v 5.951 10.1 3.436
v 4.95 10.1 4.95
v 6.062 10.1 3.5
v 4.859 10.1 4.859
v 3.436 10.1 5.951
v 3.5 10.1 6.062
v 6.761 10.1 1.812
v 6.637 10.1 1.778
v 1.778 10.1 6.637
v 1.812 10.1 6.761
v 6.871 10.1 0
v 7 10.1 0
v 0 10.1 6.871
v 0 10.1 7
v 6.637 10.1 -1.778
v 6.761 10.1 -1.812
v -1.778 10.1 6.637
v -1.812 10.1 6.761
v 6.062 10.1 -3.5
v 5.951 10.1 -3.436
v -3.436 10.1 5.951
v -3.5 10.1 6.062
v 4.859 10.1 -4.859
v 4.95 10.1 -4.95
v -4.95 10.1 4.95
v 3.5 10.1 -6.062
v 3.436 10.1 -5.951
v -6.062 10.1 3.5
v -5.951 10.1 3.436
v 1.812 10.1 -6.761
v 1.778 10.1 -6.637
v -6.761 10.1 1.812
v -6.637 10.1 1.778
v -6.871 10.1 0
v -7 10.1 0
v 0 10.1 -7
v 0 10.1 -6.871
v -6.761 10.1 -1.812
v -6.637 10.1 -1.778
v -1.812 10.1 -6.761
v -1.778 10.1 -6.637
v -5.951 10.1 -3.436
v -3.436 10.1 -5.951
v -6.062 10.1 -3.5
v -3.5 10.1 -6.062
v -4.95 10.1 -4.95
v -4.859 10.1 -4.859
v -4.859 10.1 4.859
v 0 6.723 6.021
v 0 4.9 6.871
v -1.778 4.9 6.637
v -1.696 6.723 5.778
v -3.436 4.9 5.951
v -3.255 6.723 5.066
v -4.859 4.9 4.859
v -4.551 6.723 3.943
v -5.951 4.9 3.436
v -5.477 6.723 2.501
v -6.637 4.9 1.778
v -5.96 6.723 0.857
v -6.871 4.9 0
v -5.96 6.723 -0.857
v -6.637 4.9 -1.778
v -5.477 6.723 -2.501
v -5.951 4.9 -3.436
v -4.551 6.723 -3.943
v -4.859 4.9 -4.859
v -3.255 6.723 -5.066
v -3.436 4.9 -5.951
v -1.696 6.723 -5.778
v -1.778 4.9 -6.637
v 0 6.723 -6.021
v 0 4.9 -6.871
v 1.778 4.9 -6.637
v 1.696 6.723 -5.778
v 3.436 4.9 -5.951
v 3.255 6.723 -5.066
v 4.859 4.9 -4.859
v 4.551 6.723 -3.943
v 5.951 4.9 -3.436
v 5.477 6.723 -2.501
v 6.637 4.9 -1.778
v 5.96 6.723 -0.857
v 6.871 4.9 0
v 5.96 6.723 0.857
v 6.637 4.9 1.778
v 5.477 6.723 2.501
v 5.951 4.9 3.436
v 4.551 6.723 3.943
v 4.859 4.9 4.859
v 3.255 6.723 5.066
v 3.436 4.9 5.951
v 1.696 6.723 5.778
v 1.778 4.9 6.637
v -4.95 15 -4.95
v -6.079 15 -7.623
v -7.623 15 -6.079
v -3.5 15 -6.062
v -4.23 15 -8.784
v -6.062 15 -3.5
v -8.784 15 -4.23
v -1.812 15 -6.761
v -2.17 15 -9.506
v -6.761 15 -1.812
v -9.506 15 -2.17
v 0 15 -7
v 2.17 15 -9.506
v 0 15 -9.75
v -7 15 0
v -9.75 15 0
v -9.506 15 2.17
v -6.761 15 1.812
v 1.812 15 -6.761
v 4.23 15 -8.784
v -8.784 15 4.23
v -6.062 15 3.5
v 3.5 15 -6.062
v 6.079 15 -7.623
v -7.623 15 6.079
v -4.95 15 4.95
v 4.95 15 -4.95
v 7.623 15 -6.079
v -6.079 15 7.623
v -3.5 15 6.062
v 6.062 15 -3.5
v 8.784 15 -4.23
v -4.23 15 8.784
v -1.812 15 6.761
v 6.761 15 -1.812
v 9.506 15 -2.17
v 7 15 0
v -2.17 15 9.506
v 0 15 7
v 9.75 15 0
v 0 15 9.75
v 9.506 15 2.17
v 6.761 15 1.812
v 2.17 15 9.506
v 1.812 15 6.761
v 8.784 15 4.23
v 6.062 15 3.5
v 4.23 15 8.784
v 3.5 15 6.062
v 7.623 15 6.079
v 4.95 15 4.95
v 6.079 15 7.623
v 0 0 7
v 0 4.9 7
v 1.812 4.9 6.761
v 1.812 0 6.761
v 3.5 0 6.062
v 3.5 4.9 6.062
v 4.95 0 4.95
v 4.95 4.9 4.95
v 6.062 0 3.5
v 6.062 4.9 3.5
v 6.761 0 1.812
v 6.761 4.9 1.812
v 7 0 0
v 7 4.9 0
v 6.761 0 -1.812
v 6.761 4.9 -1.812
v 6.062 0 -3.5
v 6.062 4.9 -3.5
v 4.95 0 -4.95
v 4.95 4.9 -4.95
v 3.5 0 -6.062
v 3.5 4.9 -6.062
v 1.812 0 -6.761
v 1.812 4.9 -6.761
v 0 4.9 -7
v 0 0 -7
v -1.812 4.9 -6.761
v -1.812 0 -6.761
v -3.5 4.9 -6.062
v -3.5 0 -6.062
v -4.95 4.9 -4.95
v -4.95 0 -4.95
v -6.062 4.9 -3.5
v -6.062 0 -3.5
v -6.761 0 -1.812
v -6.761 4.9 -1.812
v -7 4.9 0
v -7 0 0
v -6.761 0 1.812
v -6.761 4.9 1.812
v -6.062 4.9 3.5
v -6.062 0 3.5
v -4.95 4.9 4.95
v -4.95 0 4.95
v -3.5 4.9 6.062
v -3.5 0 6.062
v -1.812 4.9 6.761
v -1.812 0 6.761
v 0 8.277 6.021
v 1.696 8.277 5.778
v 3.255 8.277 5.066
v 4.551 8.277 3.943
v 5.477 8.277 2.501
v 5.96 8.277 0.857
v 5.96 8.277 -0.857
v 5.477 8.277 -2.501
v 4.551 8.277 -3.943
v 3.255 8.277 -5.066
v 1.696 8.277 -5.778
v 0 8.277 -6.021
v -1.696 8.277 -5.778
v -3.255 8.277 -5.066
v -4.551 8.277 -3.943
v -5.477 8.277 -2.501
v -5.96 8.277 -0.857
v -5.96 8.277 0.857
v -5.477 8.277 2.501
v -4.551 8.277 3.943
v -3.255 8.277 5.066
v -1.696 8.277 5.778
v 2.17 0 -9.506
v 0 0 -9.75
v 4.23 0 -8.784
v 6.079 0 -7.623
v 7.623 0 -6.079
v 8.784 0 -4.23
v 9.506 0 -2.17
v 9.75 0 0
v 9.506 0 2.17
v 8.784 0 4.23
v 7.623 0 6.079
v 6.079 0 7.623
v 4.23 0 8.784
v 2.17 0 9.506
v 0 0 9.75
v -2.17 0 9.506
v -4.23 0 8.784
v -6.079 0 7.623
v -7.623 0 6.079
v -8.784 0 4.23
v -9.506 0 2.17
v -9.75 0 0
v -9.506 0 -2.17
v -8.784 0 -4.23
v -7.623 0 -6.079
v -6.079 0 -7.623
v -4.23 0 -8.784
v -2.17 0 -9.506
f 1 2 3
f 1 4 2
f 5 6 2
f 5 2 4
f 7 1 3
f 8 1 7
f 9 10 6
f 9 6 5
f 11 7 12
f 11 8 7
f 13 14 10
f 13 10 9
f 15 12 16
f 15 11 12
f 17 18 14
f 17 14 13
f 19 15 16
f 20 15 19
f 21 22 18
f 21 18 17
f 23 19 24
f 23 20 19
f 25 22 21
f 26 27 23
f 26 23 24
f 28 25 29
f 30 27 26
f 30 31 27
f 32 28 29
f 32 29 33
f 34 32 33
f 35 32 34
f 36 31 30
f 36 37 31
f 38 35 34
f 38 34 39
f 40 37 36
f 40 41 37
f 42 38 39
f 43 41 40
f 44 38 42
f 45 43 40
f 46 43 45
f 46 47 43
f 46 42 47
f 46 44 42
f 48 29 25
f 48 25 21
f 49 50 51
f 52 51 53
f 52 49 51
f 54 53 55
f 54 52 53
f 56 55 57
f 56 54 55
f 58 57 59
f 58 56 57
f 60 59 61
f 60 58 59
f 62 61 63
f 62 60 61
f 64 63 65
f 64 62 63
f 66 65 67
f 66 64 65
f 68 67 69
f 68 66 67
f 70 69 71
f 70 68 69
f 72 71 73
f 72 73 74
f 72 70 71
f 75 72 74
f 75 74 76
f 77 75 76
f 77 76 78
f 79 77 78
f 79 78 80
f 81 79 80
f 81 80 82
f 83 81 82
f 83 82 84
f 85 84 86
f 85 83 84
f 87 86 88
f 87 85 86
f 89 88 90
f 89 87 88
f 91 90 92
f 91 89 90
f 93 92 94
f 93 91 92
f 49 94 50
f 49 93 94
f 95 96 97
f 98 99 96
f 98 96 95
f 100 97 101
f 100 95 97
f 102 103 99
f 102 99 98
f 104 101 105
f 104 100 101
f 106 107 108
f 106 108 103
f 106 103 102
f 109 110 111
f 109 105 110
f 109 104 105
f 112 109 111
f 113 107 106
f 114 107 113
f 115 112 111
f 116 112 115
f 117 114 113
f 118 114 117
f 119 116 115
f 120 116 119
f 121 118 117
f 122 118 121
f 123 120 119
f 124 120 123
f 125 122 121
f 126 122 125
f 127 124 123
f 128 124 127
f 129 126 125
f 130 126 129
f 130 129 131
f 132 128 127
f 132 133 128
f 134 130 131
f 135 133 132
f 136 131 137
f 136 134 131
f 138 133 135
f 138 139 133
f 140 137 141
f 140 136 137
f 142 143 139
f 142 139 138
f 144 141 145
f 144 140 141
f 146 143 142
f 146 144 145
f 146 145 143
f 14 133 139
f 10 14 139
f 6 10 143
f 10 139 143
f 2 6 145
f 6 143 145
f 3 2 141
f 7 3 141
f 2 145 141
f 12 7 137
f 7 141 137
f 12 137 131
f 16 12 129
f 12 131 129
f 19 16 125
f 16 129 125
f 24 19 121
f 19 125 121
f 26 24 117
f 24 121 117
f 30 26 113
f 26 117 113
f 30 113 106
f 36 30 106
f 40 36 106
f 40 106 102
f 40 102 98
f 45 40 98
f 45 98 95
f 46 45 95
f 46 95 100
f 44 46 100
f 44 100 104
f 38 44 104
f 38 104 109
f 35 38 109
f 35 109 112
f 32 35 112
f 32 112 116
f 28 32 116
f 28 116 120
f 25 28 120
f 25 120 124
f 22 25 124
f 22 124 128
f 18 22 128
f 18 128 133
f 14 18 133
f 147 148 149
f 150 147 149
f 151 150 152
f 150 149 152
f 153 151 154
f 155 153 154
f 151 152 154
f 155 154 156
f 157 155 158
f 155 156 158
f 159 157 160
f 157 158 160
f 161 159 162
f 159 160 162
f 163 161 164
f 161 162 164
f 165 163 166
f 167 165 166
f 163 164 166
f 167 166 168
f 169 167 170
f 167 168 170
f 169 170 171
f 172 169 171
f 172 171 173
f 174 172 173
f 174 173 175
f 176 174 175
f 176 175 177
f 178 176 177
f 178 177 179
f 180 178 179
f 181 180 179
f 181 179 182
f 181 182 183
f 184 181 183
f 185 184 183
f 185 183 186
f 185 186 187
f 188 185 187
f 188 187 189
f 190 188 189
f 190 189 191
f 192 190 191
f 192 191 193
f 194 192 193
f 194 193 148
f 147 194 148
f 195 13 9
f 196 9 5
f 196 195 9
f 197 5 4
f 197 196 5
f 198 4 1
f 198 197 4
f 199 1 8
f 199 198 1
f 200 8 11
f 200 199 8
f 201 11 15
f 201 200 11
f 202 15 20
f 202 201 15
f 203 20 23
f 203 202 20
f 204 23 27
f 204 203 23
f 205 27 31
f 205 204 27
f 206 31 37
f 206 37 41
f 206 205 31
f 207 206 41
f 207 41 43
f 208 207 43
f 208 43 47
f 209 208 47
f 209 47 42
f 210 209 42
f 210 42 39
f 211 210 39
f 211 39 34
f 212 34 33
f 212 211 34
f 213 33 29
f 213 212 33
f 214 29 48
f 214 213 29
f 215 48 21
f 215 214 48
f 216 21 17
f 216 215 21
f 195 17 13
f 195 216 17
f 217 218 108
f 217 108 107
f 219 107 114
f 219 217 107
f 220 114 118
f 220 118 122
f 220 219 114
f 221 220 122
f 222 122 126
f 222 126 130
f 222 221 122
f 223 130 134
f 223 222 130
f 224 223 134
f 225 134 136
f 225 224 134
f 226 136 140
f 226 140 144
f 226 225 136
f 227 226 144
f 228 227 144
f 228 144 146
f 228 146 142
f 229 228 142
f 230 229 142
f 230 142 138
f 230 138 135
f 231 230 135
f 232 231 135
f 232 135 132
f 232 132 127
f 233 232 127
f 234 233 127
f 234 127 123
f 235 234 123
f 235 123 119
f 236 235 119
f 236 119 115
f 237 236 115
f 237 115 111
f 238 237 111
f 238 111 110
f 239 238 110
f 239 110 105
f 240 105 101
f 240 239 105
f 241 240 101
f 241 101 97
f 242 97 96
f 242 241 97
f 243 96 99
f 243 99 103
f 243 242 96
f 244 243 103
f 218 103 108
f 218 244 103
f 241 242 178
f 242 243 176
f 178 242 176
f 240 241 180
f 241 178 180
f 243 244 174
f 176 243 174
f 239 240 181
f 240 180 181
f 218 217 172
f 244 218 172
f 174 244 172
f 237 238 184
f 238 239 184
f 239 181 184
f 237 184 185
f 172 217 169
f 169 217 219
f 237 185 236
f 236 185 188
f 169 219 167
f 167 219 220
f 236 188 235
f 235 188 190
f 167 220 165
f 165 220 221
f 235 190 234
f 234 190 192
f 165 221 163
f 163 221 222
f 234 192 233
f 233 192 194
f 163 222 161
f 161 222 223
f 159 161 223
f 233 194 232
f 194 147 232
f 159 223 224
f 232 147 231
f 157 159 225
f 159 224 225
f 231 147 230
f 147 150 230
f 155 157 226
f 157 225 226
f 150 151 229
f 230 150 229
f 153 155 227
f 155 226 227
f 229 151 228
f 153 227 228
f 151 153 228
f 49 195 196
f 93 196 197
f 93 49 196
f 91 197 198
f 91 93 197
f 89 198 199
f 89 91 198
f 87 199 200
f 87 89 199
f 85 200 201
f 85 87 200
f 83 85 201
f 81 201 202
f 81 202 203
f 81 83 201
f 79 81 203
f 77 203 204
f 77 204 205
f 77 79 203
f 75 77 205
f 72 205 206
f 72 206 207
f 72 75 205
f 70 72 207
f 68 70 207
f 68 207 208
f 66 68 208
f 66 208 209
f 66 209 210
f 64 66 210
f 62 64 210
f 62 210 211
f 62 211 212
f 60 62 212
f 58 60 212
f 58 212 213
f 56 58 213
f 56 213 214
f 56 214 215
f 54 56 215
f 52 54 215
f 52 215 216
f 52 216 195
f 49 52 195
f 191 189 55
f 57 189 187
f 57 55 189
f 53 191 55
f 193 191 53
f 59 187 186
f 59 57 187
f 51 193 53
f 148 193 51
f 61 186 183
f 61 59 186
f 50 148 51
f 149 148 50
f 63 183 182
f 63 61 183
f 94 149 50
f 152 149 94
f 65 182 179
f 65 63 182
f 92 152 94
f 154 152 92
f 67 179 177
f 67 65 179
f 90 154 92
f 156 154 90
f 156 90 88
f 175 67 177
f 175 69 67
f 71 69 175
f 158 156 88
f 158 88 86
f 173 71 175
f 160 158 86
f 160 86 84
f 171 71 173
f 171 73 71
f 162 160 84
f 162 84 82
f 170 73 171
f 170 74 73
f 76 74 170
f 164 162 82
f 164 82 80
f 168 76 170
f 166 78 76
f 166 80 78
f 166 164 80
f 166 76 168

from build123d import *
from OCP.BRepFilletAPI import BRepFilletAPI_MakeChamfer

# Parameters (mm, degrees)
SKETCH1_R           = 12
SKETCH1_R_2         = 5
BOSS_EXTRUDE1_DEPTH = 15
SKETCH2_R           = 7
CUT_EXTRUDE1_DEPTH  = 5.1
CUT_EXTRUDE2_START  = -5.1
SKETCH3_R           = 7
CUT_EXTRUDE2_DEPTH  = 5.1
BOSS_EXTRUDE2_START = -4.8
SKETCH4_R           = 5
SKETCH4_R_2         = 3
BOSS_EXTRUDE2_DEPTH = 4.8
SKETCH5_R           = 17.644165846
SKETCH5_R_2         = 10
CUT_EXTRUDE3_DEPTH  = 17.1
SKETCH6_R           = 7.1
CUT_EXTRUDE4_DEPTH  = 5.1
CUT_EXTRUDE5_START  = -5.1
SKETCH7_R           = 7.1
CUT_EXTRUDE5_DEPTH  = 5.1
SKETCH8_R           = 14.835126002
SKETCH8_R_2         = 9.75
CUT_EXTRUDE7_DEPTH  = 26
SKETCH9_R           = 6.0214871
CUT_EXTRUDE8_DEPTH  = 10
BOSS_EXTRUDE3_START = 0.2
SKETCH10_R          = 7.1
SKETCH10_R_2        = 6.0214871
BOSS_EXTRUDE3_DEPTH = 0.2
SKETCH11_R          = 7.1
SKETCH11_R_2        = 6.0214871
BOSS_EXTRUDE4_DEPTH = 0.2
CHAMFER2_SIZE       = 0.85
CHAMFER2_SIZE2      = 1.822830882
BOSS_EXTRUDE5_REACH = 22.375
SKETCH12_R          = 9.75
SKETCH12_R_2        = 7


with BuildPart() as part:
    # Sketch1 → Boss-Extrude1 (new body)
    with BuildSketch(Plane(origin=(0, 0, 0), x_dir=(1, 0, 0), z_dir=(0, 1, 0))):
        with Locations(Location((0, 0, 0), (0, 0, 270))):
            Circle(SKETCH1_R)
        with Locations(Location((0, 0, 0), (0, 0, 270))):
            Circle(SKETCH1_R_2, mode=Mode.SUBTRACT)
    extrude(amount=BOSS_EXTRUDE1_DEPTH)

    # Sketch2 → Cut-Extrude1 (cut)
    with BuildSketch(Plane.XZ):
        with Locations(Location((0, 0, 0), (0, 0, 270))):
            Circle(SKETCH2_R)
    extrude(amount=-CUT_EXTRUDE1_DEPTH, mode=Mode.SUBTRACT)

    # Sketch3 → Cut-Extrude2 (cut)
    with BuildSketch(Plane(origin=(0, 15, 0), x_dir=(1, 0, 0), z_dir=(0, 1, 0)).offset(CUT_EXTRUDE2_START)):
        with Locations(Location((0, 0, 0), (0, 0, 90))):
            Circle(SKETCH3_R)
    extrude(amount=CUT_EXTRUDE2_DEPTH, mode=Mode.SUBTRACT)

    # Sketch4 → Boss-Extrude2 (add)
    with BuildSketch(Plane(origin=(0, 9.9, 0), x_dir=(1, 0, 0), z_dir=(0, 1, 0)).offset(BOSS_EXTRUDE2_START)):
        Circle(SKETCH4_R)
        with Locations(Location((0, 0, 0), (0, 0, 270))):
            Circle(SKETCH4_R_2, mode=Mode.SUBTRACT)
    extrude(amount=BOSS_EXTRUDE2_DEPTH)

    # Sketch5 → Cut-Extrude3 (cut)
    with BuildSketch(Plane.XZ):
        Circle(SKETCH5_R)
        with Locations(Location((0, 0, 0), (0, 0, 270))):
            Circle(SKETCH5_R_2, mode=Mode.SUBTRACT)
    extrude(amount=-CUT_EXTRUDE3_DEPTH, mode=Mode.SUBTRACT)

    # Sketch6 → Cut-Extrude4 (cut)
    with BuildSketch(Plane.XZ):
        with Locations(Location((0, 0, 0), (0, 0, 270))):
            Circle(SKETCH6_R)
    extrude(amount=-CUT_EXTRUDE4_DEPTH, mode=Mode.SUBTRACT)

    # Sketch7 → Cut-Extrude5 (cut)
    with BuildSketch(Plane(origin=(0, 15, 0), x_dir=(1, 0, 0), z_dir=(0, 1, 0)).offset(CUT_EXTRUDE5_START)):
        with Locations(Location((0, 0, 0), (0, 0, 90))):
            Circle(SKETCH7_R)
    extrude(amount=CUT_EXTRUDE5_DEPTH, mode=Mode.SUBTRACT)

    # Sketch8 → Cut-Extrude7 (cut)
    with BuildSketch(Plane.XZ):
        Circle(SKETCH8_R)
        with Locations(Location((0, 0, 0), (0, 0, 270))):
            Circle(SKETCH8_R_2, mode=Mode.SUBTRACT)
    extrude(amount=-CUT_EXTRUDE7_DEPTH, mode=Mode.SUBTRACT)

    # Sketch9 → Cut-Extrude8 (cut)
    with BuildSketch(Plane(origin=(0, 9.9, 0), x_dir=(1, 0, 0), z_dir=(0, 1, 0))):
        with Locations(Location((0, 0, 0), (0, 0, 270))):
            Circle(SKETCH9_R)
    extrude(amount=-CUT_EXTRUDE8_DEPTH, mode=Mode.SUBTRACT)

    # Sketch10 → Boss-Extrude3 (add)
    with BuildSketch(Plane.XZ.offset(-5.1).offset(BOSS_EXTRUDE3_START)):
        with Locations(Location((0, 0, 0), (0, 0, 270))):
            Circle(SKETCH10_R)
        with Locations(Location((0, 0, 0), (0, 0, 90))):
            Circle(SKETCH10_R_2, mode=Mode.SUBTRACT)
    extrude(amount=-BOSS_EXTRUDE3_DEPTH)

    # Sketch11 → Boss-Extrude4 (add)
    with BuildSketch(Plane(origin=(0, 9.9, 0), x_dir=(1, 0, 0), z_dir=(0, 1, 0))):
        with Locations(Location((0, 0, 0), (0, 0, 90))):
            Circle(SKETCH11_R)
        with Locations(Location((0, 0, 0), (0, 0, 270))):
            Circle(SKETCH11_R_2, mode=Mode.SUBTRACT)
    extrude(amount=BOSS_EXTRUDE4_DEPTH)

    # Chamfer2: one chamfer whose edges measure the first distance from different faces: ONE call of the kernel's chamfer builder (chamfer() names one face for all edges)
    chamfer2_edges_1 = [part.edges().sort_by_distance(p)[0] for p in [
        (0, 4.9, -6.0214871),
    ]]
    chamfer2_side_1 = [part.faces().sort_by_distance(p)[0] for p in [
        (0, 4.9, 6.899181674),
    ]]
    chamfer2_edges_2 = [part.edges().sort_by_distance(p)[0] for p in [
        (0, 10.1, -6.0214871),
    ]]
    chamfer2_side_2 = [part.faces().sort_by_distance(p)[0] for p in [
        (0, 10.1, 6.899181674),
    ]]
    chamfer2 = BRepFilletAPI_MakeChamfer(part.part.solid().wrapped)
    for e in chamfer2_edges_1:
        chamfer2.Add(CHAMFER2_SIZE, CHAMFER2_SIZE2, e.wrapped, chamfer2_side_1[0].wrapped)  # the first distance lies on this face
    for e in chamfer2_edges_2:
        chamfer2.Add(CHAMFER2_SIZE, CHAMFER2_SIZE2, e.wrapped, chamfer2_side_2[0].wrapped)  # the first distance lies on this face
    add(Compound.cast(chamfer2.Shape()), mode=Mode.REPLACE)

    # Boss-Extrude5: up to this face of the body (flat: up to its plane)
    boss_extrude5_end = Plane(part.part.faces().sort_by_distance((0, 0, 9.474228355))[0])
    # Sketch12 → Boss-Extrude5 (add, up to the picked face)
    with BuildSketch(Plane(origin=(0, 15, 0), x_dir=(1, 0, 0), z_dir=(0, 1, 0)), mode=Mode.PRIVATE) as boss_extrude5_sk1:
        with Locations(Location((0, 0, 0), (0, 0, 90))):
            Circle(SKETCH12_R)
        with Locations(Location((0, 0, 0), (0, 0, 270))):
            Circle(SKETCH12_R_2, mode=Mode.SUBTRACT)
    boss_extrude5_tool1 = split(extrude(boss_extrude5_sk1.sketch, amount=-BOSS_EXTRUDE5_REACH, mode=Mode.PRIVATE), bisect_by=boss_extrude5_end, keep=Keep.BOTH, mode=Mode.PRIVATE)
    add(boss_extrude5_tool1.solids().sort_by(Axis((0, 15, 9.474228), (0, -1, 0)))[0])


solid = part.part
